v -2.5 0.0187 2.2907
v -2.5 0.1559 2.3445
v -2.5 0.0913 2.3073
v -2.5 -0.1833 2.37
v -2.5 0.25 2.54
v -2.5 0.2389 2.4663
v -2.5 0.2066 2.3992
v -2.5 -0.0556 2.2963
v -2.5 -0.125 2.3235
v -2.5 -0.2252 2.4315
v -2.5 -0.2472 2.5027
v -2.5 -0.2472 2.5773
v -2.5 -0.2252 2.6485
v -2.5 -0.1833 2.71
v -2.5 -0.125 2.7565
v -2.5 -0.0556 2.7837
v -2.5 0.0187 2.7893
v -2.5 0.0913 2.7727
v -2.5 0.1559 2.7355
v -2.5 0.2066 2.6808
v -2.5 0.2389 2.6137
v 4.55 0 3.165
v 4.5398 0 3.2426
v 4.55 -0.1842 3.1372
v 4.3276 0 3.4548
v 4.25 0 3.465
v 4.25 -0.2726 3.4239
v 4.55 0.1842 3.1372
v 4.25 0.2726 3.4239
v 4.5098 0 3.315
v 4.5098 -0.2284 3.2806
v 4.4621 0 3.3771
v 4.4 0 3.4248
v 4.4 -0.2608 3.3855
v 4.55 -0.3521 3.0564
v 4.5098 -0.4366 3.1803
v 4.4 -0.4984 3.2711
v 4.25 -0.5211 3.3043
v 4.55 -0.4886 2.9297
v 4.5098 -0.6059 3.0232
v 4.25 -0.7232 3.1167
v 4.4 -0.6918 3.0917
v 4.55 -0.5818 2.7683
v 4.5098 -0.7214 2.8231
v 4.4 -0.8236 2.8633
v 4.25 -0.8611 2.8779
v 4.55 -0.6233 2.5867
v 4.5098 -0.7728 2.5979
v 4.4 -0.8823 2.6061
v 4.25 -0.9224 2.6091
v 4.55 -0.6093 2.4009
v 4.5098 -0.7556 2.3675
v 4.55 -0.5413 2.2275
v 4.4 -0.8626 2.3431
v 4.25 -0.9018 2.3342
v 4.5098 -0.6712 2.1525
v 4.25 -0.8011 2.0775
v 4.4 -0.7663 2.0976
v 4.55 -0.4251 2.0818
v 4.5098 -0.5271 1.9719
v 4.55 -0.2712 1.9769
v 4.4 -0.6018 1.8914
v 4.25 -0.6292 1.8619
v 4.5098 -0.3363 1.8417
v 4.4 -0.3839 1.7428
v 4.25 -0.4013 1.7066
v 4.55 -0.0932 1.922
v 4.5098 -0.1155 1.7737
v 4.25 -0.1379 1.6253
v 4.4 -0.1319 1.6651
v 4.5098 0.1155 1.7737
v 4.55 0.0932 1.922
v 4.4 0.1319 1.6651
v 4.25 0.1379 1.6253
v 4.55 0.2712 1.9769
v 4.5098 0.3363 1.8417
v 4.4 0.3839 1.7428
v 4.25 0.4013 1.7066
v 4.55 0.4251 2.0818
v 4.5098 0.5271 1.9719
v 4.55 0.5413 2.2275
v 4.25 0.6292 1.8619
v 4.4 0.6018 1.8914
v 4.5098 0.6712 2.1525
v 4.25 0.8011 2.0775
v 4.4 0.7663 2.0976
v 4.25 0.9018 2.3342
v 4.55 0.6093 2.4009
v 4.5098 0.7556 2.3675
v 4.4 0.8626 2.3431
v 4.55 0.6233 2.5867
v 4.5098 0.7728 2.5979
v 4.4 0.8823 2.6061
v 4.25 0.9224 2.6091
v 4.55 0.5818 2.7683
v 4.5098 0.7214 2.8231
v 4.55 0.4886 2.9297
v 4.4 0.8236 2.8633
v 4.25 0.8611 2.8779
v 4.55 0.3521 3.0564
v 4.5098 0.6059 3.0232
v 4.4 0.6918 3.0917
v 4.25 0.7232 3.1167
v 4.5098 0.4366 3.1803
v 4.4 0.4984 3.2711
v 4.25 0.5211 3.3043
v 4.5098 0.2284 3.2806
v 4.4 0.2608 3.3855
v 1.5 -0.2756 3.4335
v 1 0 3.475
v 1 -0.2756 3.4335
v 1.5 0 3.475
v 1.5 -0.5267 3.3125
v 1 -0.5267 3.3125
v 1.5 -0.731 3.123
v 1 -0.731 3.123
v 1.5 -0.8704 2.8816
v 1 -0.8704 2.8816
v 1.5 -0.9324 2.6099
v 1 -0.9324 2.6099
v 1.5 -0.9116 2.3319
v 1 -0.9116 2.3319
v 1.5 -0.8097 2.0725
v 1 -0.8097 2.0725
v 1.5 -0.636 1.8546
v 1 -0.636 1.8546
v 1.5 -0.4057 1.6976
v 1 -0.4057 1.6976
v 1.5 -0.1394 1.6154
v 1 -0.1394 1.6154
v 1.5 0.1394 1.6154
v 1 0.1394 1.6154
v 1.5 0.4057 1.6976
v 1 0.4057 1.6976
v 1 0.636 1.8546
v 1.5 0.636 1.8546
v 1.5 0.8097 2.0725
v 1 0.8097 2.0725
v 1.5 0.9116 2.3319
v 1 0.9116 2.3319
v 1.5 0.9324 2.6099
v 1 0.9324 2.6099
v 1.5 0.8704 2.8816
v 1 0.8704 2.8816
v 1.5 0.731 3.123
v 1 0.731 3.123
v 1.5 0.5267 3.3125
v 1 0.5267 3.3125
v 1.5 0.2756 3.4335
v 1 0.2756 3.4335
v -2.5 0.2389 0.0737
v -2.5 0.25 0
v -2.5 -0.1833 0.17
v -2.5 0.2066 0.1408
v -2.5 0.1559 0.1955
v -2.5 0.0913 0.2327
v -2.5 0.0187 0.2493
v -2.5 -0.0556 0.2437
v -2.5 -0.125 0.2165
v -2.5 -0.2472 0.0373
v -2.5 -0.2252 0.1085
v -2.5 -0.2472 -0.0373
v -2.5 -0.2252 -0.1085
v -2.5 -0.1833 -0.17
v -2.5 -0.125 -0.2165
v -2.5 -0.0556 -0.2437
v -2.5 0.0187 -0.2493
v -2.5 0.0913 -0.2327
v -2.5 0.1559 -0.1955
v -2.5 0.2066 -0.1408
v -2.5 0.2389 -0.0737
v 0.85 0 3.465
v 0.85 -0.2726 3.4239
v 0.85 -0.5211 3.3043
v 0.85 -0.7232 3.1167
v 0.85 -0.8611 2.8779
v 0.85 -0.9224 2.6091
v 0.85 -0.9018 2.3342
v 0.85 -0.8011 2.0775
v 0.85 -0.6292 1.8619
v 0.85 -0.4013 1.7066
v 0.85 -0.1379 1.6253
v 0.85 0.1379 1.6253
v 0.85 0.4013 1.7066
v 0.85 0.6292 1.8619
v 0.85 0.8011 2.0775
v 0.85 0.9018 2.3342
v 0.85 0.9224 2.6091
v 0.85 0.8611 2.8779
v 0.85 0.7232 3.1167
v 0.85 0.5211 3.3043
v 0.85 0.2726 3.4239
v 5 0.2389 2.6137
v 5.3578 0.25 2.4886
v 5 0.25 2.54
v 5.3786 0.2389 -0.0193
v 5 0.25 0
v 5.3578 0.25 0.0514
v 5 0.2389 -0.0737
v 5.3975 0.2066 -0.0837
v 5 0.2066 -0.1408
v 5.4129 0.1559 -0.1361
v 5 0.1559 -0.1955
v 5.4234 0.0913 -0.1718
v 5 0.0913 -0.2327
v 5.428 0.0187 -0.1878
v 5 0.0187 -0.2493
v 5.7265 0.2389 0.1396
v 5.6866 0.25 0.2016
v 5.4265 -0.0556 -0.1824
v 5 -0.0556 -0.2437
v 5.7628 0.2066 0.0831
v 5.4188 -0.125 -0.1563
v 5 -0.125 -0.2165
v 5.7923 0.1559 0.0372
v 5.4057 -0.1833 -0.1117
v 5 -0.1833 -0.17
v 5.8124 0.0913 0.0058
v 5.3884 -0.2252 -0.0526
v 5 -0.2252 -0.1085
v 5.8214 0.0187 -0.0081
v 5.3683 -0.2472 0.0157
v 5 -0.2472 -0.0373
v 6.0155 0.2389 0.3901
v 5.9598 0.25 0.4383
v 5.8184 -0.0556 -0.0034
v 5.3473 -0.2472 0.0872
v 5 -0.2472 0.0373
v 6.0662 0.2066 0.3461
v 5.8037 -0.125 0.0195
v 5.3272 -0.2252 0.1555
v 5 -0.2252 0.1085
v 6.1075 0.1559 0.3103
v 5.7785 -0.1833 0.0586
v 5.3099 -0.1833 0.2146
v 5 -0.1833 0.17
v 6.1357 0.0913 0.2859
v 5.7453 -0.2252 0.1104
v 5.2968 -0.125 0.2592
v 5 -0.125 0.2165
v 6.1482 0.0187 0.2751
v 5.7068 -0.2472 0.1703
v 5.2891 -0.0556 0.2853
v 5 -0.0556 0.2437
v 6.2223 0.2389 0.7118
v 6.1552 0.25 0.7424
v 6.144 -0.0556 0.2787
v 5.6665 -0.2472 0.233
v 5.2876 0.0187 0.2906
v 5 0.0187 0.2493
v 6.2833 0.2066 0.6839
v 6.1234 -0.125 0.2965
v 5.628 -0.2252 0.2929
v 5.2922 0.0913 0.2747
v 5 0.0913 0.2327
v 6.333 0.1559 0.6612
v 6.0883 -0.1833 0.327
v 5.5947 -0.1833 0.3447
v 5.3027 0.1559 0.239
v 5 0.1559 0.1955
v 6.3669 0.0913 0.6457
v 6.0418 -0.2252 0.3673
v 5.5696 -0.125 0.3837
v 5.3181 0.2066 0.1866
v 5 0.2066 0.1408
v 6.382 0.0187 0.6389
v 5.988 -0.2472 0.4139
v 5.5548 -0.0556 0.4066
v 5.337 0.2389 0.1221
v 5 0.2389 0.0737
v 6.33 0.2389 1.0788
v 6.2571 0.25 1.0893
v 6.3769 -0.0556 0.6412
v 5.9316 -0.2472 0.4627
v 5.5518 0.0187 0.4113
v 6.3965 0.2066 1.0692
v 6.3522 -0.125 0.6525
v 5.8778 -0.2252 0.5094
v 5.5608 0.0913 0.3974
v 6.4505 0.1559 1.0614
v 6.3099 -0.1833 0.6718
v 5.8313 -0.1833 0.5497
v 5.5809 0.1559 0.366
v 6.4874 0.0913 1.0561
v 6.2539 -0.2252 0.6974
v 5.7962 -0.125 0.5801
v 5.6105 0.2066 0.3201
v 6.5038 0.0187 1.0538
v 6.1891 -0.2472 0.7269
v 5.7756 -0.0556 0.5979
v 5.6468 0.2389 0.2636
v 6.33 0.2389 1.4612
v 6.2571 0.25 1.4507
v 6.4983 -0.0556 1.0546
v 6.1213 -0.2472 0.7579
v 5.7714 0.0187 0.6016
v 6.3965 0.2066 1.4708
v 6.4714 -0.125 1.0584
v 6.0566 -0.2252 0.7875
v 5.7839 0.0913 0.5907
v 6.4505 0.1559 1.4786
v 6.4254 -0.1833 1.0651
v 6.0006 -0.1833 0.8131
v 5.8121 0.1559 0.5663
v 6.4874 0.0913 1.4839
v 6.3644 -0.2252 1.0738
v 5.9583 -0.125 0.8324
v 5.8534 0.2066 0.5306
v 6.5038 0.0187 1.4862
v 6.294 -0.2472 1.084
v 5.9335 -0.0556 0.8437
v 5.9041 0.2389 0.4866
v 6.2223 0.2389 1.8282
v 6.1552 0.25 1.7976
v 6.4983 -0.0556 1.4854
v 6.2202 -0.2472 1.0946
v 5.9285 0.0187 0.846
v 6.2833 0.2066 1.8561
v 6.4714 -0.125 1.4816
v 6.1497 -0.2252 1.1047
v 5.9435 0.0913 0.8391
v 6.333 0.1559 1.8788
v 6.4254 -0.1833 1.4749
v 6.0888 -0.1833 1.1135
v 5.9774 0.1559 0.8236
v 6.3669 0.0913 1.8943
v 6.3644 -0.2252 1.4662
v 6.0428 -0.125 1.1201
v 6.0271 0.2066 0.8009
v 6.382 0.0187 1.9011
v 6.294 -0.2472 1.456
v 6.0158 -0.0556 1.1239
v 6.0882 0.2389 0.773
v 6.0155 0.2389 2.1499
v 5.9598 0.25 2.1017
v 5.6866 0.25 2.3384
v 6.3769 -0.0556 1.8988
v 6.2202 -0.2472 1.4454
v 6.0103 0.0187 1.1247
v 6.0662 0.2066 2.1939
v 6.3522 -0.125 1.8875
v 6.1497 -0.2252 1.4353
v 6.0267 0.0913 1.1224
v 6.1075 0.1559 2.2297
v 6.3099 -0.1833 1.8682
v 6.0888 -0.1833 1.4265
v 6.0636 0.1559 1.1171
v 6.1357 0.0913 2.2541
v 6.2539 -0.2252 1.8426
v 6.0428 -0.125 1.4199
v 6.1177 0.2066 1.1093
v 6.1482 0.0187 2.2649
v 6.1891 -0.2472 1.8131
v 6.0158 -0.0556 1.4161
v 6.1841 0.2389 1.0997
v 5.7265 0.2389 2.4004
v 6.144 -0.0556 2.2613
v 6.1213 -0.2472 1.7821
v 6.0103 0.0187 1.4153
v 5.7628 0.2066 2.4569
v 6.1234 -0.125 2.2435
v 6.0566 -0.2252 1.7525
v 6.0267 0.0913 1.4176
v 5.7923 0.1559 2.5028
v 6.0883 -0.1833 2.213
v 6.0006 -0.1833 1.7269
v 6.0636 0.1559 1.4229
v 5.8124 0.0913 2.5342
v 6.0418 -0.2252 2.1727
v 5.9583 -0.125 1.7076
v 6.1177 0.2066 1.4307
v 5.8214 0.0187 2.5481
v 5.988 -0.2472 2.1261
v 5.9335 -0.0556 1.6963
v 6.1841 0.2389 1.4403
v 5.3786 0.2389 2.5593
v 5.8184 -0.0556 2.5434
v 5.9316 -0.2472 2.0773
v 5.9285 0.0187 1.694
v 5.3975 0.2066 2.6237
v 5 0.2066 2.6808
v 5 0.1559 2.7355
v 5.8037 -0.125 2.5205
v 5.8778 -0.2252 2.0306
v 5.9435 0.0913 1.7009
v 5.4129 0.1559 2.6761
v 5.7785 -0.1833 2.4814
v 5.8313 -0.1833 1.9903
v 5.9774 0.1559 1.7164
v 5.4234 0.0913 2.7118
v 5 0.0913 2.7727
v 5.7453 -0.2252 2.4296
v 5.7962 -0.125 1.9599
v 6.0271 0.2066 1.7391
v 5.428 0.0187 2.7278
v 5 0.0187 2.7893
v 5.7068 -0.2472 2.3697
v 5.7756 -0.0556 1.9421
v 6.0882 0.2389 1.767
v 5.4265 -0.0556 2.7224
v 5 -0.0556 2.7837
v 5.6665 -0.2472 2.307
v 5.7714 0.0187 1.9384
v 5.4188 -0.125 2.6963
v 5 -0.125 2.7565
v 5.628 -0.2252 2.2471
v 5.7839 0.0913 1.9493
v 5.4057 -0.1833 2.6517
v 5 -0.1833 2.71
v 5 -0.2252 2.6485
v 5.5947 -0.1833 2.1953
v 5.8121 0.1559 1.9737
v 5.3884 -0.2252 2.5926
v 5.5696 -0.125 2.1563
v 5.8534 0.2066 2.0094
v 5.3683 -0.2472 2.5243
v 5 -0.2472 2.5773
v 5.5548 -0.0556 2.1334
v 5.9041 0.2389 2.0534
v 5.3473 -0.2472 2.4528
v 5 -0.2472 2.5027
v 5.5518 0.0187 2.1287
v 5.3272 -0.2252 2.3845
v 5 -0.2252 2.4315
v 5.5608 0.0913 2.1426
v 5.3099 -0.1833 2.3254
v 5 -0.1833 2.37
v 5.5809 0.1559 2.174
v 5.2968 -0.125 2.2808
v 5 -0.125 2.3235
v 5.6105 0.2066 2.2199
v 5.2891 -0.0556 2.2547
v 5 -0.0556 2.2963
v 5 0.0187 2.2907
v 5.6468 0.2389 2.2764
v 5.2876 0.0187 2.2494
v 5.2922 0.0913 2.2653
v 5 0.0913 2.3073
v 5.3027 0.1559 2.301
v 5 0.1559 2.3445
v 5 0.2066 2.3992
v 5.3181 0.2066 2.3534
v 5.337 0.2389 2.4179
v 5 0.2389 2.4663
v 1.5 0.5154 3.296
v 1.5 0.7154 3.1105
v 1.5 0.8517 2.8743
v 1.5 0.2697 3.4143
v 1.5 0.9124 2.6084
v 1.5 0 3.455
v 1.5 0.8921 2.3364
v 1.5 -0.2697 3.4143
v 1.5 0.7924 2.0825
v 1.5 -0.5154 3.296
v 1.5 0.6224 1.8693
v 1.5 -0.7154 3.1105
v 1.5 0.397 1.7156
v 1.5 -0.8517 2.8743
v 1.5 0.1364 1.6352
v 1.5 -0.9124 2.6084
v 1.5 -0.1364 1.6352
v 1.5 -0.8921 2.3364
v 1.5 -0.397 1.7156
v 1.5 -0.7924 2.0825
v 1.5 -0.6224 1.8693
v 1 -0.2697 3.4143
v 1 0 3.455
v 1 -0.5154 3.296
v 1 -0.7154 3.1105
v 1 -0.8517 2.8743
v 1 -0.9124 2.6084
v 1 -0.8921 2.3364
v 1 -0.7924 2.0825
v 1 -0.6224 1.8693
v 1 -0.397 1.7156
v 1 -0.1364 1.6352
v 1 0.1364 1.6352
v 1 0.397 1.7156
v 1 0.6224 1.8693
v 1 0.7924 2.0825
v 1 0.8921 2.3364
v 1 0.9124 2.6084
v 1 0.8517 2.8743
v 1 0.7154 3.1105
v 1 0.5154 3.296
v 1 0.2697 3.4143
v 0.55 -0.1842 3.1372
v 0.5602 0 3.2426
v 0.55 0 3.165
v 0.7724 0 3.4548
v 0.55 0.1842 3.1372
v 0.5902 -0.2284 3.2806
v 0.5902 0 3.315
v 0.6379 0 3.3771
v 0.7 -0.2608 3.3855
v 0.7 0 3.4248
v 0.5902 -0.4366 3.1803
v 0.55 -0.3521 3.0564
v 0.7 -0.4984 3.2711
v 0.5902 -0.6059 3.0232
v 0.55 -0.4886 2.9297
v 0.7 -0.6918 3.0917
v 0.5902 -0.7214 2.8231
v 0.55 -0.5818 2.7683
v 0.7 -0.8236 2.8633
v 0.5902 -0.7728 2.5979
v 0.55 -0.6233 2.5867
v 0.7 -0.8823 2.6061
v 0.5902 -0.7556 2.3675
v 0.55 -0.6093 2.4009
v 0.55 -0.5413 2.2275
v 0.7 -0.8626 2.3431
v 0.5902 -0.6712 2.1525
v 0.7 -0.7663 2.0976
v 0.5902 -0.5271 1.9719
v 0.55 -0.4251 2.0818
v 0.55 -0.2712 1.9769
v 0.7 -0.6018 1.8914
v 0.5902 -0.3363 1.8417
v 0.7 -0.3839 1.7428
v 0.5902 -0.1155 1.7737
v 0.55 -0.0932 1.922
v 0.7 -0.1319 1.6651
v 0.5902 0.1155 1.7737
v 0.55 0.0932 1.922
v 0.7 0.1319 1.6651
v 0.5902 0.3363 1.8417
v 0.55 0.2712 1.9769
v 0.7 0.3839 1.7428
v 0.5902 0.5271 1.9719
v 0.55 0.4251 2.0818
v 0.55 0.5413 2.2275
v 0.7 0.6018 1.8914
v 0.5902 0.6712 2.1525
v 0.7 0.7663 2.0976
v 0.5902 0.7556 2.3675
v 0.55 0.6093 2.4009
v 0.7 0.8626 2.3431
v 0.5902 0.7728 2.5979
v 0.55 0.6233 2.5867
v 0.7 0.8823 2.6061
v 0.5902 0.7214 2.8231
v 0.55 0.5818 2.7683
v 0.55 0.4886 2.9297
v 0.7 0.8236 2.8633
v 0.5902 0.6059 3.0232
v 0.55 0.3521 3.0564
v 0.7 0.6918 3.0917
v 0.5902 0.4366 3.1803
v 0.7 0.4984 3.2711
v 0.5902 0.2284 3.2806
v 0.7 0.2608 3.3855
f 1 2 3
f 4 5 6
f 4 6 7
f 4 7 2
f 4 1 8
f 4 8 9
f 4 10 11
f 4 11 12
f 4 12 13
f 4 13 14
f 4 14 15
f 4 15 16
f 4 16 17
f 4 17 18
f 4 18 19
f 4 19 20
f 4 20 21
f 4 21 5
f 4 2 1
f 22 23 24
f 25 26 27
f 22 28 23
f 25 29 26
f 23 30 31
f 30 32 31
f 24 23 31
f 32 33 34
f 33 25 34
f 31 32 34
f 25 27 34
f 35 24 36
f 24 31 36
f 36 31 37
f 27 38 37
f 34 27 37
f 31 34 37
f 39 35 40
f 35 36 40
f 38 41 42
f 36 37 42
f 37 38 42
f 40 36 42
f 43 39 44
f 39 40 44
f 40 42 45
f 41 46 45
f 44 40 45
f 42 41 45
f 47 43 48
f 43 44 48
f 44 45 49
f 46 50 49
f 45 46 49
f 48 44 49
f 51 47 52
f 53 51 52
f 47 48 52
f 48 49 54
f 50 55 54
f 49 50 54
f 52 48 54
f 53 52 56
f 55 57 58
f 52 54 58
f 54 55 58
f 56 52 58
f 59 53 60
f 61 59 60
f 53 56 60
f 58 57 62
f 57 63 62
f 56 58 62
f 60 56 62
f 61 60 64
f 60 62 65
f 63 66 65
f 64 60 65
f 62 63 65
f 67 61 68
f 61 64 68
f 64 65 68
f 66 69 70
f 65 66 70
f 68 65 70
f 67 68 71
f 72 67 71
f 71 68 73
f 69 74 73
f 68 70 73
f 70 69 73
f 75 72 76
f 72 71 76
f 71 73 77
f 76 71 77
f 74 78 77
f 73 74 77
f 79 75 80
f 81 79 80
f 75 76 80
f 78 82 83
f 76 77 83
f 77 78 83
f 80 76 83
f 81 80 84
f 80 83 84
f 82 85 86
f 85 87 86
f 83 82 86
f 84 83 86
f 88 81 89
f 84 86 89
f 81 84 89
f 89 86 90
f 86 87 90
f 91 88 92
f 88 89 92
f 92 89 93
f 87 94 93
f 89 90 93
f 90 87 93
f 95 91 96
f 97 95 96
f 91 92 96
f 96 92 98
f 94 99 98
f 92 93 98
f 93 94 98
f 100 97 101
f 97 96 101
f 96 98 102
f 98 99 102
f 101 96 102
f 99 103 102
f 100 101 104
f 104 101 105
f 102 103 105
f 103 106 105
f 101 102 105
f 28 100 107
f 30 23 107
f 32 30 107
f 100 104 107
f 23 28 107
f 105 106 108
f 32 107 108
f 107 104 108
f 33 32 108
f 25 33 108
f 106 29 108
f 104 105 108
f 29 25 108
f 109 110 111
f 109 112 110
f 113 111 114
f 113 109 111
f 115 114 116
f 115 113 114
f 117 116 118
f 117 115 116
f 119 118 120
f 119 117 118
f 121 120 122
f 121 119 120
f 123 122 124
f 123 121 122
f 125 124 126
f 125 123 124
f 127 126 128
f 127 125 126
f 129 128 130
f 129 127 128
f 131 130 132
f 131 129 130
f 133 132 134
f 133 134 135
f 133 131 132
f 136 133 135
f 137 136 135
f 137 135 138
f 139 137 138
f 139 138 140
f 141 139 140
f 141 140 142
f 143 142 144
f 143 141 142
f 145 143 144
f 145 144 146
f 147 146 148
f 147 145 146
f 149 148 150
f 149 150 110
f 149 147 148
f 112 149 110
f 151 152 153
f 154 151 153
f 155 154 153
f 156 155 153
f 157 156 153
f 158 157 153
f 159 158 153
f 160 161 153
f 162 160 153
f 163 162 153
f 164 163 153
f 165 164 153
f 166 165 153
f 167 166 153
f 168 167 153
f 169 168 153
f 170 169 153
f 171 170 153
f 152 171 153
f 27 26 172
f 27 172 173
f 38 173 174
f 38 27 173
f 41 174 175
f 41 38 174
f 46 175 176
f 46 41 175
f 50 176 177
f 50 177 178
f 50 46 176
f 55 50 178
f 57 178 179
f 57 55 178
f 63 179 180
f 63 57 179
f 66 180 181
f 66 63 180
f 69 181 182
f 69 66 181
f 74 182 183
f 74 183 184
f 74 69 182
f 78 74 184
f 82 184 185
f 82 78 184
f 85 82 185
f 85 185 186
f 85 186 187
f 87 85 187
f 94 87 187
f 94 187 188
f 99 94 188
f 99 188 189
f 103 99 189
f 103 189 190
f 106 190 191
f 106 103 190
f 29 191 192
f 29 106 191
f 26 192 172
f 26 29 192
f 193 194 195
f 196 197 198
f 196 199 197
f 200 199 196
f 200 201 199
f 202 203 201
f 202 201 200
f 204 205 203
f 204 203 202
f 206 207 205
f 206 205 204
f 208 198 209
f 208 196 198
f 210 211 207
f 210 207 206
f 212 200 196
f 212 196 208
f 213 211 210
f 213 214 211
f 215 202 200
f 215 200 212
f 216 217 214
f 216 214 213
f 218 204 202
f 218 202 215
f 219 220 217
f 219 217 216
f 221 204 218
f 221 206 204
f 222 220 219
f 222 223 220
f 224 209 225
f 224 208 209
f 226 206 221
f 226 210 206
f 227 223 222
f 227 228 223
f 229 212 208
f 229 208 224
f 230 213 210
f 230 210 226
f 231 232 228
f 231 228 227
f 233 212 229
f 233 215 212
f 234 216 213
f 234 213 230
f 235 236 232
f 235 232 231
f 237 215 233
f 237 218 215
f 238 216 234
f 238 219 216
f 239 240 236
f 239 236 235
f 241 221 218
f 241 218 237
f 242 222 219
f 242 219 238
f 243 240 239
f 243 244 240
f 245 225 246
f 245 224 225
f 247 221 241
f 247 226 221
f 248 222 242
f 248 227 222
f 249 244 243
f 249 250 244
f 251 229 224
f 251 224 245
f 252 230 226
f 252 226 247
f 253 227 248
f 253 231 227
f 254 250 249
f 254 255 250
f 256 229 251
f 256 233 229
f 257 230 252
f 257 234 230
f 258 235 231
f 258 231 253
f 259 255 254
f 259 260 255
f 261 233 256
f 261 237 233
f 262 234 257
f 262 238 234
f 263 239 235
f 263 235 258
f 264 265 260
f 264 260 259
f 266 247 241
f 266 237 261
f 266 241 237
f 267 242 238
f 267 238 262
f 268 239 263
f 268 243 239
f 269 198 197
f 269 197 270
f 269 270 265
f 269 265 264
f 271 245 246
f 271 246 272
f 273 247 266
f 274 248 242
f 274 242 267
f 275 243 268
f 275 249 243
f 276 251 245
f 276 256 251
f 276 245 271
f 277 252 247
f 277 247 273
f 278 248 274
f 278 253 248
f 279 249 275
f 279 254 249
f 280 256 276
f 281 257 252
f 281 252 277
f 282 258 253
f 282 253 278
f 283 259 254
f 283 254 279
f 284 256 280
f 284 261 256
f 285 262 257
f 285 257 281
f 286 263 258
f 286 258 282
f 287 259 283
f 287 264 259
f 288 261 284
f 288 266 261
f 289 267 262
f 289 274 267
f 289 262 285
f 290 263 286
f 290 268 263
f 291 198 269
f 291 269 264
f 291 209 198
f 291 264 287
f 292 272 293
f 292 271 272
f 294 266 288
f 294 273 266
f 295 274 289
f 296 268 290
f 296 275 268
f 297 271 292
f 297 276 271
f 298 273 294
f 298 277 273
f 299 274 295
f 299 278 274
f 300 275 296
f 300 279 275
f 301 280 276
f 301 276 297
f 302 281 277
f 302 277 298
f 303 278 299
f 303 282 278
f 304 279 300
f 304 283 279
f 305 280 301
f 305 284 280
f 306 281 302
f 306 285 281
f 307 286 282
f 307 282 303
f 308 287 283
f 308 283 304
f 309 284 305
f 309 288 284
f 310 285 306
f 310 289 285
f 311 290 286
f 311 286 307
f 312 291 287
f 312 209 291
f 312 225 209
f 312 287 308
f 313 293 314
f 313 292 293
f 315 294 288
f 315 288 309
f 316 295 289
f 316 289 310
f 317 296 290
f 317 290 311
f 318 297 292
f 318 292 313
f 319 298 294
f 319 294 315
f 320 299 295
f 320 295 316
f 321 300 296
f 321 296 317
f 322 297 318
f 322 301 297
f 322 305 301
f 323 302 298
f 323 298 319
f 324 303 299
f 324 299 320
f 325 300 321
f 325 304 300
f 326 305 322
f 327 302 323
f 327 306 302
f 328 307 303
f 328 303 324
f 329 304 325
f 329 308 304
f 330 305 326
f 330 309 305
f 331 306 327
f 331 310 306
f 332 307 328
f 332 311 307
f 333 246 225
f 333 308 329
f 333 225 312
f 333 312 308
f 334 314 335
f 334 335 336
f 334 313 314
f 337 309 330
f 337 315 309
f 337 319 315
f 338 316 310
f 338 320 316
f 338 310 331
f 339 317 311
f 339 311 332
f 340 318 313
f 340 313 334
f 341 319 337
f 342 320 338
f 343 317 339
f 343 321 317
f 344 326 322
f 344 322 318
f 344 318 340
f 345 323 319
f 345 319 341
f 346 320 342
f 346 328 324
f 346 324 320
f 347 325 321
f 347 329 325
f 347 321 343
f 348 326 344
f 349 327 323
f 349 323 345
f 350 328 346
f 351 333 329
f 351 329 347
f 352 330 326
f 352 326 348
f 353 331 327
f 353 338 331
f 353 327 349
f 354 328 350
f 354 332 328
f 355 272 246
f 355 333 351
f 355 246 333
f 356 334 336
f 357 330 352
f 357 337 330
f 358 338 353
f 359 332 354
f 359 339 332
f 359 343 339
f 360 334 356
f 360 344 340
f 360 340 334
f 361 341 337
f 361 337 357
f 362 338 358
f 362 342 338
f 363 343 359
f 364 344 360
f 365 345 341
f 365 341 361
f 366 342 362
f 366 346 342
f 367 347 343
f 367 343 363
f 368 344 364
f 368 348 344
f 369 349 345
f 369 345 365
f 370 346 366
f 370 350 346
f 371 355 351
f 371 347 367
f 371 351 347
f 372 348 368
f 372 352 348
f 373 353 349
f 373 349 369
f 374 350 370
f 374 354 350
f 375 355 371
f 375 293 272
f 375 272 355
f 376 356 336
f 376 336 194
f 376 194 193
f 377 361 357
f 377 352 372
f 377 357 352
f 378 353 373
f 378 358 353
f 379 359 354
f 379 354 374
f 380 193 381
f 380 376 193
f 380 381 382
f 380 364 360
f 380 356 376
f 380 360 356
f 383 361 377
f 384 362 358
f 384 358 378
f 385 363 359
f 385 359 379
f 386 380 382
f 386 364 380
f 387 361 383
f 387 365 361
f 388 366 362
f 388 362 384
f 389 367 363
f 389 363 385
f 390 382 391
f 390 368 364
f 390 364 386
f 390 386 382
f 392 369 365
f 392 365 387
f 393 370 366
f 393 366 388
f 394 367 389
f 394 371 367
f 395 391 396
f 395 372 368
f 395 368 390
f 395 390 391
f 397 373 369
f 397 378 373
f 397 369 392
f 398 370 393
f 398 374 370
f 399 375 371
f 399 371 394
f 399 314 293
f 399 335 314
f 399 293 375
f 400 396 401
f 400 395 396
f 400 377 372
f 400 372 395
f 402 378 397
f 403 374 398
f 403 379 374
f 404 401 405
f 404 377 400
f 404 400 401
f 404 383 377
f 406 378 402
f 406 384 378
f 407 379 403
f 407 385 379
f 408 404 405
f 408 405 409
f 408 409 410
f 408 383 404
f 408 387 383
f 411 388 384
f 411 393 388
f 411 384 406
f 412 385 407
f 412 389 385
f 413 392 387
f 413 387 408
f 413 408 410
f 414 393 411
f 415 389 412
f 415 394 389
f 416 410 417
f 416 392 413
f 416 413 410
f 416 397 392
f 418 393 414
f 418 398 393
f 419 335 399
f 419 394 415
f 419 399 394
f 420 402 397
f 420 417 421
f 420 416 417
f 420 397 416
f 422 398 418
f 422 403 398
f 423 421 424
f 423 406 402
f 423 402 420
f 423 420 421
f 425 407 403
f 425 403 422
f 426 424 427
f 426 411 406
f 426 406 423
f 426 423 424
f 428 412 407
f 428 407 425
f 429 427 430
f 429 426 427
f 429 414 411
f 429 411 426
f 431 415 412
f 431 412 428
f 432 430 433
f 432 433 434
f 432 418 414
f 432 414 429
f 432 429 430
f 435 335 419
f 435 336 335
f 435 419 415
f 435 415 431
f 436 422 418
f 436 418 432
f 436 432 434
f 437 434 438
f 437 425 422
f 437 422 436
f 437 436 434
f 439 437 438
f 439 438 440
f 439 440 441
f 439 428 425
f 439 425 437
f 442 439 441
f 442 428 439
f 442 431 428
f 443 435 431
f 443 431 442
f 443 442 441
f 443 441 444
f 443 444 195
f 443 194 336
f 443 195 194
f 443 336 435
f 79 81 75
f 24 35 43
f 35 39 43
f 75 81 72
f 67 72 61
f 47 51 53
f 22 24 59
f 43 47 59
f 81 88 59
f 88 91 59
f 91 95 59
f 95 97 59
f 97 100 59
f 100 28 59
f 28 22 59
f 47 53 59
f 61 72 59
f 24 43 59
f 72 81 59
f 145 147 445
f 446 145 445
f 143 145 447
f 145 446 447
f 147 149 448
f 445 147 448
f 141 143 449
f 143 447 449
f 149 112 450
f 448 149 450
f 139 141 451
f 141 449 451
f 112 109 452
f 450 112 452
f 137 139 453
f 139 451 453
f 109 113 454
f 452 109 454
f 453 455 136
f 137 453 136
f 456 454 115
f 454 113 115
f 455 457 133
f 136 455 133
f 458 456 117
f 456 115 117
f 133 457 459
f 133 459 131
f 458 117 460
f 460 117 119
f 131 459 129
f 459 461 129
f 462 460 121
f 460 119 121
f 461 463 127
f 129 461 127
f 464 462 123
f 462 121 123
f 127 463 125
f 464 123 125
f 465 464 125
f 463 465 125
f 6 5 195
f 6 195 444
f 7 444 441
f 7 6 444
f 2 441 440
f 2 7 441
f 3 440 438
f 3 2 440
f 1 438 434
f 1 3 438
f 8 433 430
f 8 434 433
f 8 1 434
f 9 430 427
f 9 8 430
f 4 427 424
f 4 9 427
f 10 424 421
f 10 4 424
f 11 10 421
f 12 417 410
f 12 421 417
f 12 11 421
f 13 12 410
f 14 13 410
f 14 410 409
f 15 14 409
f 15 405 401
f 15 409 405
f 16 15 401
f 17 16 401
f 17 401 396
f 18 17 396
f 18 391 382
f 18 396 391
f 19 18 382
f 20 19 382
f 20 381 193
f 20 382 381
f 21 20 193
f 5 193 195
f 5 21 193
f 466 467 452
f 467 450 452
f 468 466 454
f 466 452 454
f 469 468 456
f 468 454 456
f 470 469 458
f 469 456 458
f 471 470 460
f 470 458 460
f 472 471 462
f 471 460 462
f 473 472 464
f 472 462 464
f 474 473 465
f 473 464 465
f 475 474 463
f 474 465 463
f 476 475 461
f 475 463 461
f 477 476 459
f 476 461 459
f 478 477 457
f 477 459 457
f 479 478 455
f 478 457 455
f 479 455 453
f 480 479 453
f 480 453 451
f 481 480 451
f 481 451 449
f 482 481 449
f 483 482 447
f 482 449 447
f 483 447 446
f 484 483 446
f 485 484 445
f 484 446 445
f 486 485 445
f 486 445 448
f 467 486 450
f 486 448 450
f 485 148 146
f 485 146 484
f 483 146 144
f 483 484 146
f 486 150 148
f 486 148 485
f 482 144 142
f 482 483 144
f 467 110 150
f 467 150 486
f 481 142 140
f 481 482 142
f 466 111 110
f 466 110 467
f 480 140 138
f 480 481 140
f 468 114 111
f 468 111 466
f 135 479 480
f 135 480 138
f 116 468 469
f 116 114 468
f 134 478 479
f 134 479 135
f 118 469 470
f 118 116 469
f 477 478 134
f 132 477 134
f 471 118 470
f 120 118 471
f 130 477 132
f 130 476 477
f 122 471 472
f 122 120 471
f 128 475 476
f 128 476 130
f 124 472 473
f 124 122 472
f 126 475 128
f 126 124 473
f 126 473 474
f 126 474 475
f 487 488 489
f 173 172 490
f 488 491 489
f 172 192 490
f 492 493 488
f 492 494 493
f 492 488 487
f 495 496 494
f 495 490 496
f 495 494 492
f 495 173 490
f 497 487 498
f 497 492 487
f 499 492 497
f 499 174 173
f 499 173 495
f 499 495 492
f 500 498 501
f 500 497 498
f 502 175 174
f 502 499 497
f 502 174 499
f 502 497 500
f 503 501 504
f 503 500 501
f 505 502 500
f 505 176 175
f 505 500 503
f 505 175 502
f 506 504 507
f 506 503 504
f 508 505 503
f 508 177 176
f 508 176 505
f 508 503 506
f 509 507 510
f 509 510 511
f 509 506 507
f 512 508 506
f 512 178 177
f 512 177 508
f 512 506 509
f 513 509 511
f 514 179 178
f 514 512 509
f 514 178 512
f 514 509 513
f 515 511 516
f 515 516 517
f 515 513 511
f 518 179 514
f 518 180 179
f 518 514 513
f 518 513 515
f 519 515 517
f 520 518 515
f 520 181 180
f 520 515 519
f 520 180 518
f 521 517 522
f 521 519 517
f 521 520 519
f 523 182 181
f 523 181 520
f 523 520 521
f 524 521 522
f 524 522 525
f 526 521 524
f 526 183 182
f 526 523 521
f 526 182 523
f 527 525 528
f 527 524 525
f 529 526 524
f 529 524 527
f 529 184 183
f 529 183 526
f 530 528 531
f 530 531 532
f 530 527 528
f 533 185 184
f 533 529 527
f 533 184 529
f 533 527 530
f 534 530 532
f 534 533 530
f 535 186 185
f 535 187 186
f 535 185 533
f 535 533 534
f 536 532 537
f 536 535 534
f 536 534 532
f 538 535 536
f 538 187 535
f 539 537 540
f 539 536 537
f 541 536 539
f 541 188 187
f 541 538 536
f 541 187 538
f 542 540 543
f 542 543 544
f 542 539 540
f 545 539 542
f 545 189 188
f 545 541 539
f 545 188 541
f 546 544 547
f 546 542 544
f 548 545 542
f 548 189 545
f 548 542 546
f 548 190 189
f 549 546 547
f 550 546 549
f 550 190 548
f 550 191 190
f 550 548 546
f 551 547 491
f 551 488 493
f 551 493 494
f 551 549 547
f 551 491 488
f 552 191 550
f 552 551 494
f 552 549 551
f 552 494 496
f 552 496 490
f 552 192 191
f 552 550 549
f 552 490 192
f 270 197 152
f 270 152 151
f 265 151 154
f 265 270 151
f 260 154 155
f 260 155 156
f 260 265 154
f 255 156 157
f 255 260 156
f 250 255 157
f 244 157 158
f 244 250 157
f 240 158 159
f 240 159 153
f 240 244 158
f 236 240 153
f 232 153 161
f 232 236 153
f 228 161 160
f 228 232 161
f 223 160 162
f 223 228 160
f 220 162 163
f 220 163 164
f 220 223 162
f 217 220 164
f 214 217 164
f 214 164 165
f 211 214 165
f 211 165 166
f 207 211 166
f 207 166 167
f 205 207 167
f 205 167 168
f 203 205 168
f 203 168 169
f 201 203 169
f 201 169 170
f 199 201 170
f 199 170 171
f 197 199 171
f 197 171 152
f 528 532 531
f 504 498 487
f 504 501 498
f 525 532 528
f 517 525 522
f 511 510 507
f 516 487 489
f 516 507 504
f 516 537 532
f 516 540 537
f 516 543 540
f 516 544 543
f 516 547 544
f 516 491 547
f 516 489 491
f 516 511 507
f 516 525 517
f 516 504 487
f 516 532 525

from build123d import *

# Parameters (mm, degrees)
SKETCH_R    = 0.25
SKETCH002_W = 4
SKETCH002_H = 0.925
FILLET_R    = 0.3
SKETCH003_W = 0.5
SKETCH003_H = 0.02


with BuildPart() as sweep_body:
    # Sweep: sweep along a path in Sketch001
    with BuildLine(Plane.XZ) as sweep_path:
        Line((-2.5, 0), (5, 0))
        ThreePointArc((5, 0), (6.27, 1.27), (5, 2.54))
        Line((5, 2.54), (-2.5, 2.54))
    # Sketch → Sweep (sweep)
    with BuildSketch(Plane.YZ.offset(-2.5)):
        Circle(SKETCH_R)
    sweep(path=sweep_path.line, is_frenet=True)


with BuildPart() as fillet_body:
    # Sketch002 → Revolution (revolve)
    with BuildSketch(Plane.XZ):
        with Locations((2.55, 3.0025)):
            Rectangle(SKETCH002_W, SKETCH002_H)
    revolve(axis=Axis((0.55, 0, 2.54), (1, 0, 0)))

    # Fillet
    fillet_edges = [fillet_body.edges().sort_by_distance(p)[0] for p in [
        (0.55, 0, 1.615),
        (4.55, 0, 1.615),
    ]]
    fillet(fillet_edges, radius=FILLET_R)


with BuildPart() as revolution001:
    # Sketch003 → Revolution001 (revolve)
    with BuildSketch(Plane.XZ):
        with Locations((1.25, 3.465)):
            Rectangle(SKETCH003_W, SKETCH003_H)
    revolve(axis=Axis((0, 0, 2.54), (1, 0, 0)))


solid = Compound([sweep_body.part, fillet_body.part, revolution001.part])
